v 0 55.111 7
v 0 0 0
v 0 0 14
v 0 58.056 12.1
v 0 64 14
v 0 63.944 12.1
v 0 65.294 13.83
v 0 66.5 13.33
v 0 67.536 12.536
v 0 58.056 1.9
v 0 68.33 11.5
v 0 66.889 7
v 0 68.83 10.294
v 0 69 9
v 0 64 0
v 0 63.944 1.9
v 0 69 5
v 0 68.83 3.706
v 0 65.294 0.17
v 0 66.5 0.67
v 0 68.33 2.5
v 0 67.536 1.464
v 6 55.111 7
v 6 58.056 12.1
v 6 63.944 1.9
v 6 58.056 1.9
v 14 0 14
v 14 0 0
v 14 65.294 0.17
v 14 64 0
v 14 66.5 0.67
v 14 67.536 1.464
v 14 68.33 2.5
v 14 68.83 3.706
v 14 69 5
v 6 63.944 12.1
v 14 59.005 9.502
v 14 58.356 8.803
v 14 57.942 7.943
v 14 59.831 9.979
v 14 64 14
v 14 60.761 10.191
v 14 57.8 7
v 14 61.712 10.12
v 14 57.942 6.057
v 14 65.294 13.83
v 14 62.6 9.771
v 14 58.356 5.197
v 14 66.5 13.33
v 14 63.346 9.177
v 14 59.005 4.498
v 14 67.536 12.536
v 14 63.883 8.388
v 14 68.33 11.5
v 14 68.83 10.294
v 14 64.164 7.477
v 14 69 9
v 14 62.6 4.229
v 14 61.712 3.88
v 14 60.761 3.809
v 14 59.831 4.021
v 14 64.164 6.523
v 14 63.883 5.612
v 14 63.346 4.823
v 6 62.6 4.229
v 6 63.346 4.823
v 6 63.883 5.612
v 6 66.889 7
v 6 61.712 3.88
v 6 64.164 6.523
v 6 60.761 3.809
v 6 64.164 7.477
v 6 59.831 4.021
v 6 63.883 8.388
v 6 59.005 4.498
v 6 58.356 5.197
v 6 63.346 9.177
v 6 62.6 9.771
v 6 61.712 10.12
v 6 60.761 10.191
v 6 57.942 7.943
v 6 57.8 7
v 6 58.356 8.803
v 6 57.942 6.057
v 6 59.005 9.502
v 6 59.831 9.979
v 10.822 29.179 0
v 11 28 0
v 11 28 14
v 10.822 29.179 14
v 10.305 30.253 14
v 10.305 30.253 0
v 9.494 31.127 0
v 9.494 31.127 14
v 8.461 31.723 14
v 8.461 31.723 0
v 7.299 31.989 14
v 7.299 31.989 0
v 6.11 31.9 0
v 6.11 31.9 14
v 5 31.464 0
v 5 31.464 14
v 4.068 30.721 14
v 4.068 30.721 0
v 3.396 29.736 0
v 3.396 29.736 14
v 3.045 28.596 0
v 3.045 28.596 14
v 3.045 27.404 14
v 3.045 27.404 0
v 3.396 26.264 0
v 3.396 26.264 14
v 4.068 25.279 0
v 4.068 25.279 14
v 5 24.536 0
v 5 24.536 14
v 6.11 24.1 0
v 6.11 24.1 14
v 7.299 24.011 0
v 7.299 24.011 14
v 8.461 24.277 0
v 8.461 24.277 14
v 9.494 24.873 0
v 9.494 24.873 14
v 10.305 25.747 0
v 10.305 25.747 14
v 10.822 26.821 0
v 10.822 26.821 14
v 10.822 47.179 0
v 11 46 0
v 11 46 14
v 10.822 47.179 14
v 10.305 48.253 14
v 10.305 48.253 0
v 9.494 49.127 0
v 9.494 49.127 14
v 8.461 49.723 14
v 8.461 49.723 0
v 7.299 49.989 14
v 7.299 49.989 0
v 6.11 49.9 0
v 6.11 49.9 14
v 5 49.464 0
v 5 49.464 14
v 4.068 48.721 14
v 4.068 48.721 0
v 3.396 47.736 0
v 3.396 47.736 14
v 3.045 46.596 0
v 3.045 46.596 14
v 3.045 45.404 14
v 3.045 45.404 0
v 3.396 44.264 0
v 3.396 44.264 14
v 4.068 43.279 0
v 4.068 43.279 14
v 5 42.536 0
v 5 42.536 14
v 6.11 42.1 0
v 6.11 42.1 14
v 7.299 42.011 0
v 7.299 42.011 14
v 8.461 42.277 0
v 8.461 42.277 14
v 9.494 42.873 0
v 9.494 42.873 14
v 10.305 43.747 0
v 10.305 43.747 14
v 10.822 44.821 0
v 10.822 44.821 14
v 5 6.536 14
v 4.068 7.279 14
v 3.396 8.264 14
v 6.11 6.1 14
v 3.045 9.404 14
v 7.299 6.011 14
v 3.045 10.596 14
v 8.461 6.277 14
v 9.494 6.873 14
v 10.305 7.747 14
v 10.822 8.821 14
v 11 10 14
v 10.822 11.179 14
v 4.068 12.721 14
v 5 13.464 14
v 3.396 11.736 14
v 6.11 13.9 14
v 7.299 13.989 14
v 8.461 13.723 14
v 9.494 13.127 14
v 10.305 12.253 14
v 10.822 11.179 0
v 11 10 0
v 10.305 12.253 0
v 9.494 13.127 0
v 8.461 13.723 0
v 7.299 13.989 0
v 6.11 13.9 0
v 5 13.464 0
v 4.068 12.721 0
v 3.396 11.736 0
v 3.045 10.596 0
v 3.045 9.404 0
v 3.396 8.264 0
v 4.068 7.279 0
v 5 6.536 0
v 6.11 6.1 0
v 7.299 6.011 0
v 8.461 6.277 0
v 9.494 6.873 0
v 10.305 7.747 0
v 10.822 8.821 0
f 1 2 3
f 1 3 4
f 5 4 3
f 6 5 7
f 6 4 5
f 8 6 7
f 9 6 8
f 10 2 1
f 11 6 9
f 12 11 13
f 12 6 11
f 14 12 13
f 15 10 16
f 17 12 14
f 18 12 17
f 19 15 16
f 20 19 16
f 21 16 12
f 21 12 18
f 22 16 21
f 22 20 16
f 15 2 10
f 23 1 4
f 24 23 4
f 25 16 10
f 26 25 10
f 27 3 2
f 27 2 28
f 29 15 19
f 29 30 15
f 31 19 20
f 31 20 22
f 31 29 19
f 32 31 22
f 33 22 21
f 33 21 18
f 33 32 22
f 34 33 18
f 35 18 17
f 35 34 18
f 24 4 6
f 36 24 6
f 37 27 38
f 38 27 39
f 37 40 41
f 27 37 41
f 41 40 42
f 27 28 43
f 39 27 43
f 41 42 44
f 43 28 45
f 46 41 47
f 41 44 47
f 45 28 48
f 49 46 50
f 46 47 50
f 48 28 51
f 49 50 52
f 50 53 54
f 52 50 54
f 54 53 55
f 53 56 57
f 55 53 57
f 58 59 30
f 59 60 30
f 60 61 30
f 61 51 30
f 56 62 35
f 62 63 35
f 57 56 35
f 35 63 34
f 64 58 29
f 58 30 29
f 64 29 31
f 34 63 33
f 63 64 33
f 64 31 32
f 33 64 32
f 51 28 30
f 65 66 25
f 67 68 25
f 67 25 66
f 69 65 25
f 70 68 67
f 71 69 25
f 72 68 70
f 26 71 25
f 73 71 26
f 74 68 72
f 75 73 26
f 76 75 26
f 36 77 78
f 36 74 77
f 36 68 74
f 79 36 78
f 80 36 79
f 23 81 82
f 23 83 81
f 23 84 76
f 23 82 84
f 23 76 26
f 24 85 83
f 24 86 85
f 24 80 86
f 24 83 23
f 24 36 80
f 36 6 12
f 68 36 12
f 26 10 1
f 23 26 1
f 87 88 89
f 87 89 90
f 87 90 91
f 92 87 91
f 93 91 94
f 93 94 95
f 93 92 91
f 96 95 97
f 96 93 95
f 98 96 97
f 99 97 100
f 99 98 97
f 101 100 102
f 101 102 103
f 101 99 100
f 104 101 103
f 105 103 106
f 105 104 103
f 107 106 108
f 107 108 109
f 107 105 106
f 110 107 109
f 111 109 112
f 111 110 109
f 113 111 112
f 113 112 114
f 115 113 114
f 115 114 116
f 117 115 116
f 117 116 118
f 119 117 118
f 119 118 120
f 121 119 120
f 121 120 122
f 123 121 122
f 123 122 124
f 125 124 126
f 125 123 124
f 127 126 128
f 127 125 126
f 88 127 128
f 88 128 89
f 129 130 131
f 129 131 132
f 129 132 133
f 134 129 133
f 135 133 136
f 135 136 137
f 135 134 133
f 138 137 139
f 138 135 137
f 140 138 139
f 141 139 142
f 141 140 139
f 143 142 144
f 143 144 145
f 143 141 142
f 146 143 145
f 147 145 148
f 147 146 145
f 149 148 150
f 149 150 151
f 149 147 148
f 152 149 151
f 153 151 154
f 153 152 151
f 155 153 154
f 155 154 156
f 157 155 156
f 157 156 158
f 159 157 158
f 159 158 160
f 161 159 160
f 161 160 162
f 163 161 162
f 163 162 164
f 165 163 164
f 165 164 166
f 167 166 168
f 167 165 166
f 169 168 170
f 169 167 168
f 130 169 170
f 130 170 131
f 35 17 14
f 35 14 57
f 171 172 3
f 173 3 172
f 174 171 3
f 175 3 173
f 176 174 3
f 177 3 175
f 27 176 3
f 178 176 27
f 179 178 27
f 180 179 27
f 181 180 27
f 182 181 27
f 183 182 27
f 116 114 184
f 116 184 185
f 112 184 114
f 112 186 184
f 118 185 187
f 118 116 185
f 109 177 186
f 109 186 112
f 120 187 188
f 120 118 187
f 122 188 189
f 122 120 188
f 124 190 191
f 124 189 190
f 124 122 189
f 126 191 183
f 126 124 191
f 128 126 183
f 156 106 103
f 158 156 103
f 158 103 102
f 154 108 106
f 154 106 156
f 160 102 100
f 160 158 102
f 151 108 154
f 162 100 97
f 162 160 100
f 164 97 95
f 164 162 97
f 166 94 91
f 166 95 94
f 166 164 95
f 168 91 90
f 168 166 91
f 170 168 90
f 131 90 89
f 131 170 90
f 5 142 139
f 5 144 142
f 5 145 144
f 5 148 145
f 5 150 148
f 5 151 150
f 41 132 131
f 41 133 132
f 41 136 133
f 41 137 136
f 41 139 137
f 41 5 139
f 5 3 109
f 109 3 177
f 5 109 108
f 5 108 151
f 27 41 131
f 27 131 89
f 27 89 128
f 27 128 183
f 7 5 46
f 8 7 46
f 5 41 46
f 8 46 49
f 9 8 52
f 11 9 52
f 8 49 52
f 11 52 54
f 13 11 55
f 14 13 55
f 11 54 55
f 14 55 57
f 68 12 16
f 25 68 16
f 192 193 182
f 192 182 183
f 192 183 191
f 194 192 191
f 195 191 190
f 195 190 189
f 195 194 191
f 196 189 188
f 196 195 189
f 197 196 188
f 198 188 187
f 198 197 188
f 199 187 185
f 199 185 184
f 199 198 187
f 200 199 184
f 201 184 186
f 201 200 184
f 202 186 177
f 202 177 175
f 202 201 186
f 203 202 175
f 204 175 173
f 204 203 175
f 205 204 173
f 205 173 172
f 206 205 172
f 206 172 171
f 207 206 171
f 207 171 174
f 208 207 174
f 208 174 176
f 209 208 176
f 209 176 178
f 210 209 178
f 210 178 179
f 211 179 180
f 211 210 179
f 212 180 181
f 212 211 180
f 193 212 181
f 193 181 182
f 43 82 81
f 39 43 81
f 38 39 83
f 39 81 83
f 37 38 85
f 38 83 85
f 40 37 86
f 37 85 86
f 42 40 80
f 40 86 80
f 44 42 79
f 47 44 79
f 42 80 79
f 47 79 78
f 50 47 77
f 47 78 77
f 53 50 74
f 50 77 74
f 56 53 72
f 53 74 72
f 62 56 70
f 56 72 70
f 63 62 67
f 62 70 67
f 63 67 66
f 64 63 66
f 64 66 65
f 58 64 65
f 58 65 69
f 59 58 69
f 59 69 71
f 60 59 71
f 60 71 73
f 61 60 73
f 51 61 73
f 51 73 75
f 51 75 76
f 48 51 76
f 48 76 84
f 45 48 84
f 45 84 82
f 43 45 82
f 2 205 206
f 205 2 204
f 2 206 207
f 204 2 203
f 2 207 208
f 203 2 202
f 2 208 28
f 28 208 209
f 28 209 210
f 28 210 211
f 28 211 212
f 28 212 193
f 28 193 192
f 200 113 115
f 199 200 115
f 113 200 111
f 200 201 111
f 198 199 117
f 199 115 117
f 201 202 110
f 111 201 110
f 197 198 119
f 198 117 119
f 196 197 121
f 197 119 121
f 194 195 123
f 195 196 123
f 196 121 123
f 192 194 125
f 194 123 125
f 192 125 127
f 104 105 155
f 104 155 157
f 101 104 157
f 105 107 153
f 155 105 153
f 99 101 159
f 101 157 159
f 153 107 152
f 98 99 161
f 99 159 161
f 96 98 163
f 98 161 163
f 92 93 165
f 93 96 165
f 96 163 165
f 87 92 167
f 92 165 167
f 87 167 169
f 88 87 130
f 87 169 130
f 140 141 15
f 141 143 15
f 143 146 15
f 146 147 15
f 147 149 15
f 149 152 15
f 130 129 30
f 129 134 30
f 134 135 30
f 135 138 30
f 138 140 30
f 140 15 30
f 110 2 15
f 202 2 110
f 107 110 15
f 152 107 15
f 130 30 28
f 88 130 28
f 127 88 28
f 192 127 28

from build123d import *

# Parameters (mm, degrees)
F0_W     = 14
F0_H     = 69
F0_R     = 4
F1_DEPTH = 14
F2_R     = 3.2
F3_DEPTH = 14.001
F4_DEPTH = 6
F5_R     = 5


with BuildPart() as f1:
    # F0 (on Top) → F1 (new body)
    with BuildSketch(Plane.XY):
        with Locations((7, 34.5)):
            Rectangle(F0_W, F0_H)
        with Locations((7, 10)):
            Circle(F0_R, mode=Mode.SUBTRACT)
        with Locations((7, 28)):
            Circle(F0_R, mode=Mode.SUBTRACT)
        with Locations((7, 46)):
            Circle(F0_R, mode=Mode.SUBTRACT)
    extrude(amount=F1_DEPTH)

    # F2 (on face) → F3 (cut, through all)
    with BuildSketch(Plane(origin=(0, 0, 0), x_dir=(0, -1, 0), z_dir=(-1, 0, 0))):
        with Locations((-61, 7)):
            Circle(F2_R)
    extrude(amount=-F3_DEPTH, mode=Mode.SUBTRACT)

    # F2 (on face) → F4 (cut)
    with BuildSketch(Plane(origin=(0, 0, 0), x_dir=(0, -1, 0), z_dir=(-1, 0, 0))):
        Polygon((-63.944486, 1.9), (-58.055514, 1.9), (-55.111027, 7), (-58.055514, 12.1), (-63.944486, 12.1), (-66.888973, 7), align=None)
        with Locations((-61, 7)):
            Circle(F2_R, mode=Mode.SUBTRACT)
    extrude(amount=-F4_DEPTH, mode=Mode.SUBTRACT)

    # F5
    f5_edges = [f1.edges().sort_by_distance(p)[0] for p in [
        (7, 69, 14),
        (7, 69, 0),
    ]]
    fillet(f5_edges, radius=F5_R)


solid = f1.part
